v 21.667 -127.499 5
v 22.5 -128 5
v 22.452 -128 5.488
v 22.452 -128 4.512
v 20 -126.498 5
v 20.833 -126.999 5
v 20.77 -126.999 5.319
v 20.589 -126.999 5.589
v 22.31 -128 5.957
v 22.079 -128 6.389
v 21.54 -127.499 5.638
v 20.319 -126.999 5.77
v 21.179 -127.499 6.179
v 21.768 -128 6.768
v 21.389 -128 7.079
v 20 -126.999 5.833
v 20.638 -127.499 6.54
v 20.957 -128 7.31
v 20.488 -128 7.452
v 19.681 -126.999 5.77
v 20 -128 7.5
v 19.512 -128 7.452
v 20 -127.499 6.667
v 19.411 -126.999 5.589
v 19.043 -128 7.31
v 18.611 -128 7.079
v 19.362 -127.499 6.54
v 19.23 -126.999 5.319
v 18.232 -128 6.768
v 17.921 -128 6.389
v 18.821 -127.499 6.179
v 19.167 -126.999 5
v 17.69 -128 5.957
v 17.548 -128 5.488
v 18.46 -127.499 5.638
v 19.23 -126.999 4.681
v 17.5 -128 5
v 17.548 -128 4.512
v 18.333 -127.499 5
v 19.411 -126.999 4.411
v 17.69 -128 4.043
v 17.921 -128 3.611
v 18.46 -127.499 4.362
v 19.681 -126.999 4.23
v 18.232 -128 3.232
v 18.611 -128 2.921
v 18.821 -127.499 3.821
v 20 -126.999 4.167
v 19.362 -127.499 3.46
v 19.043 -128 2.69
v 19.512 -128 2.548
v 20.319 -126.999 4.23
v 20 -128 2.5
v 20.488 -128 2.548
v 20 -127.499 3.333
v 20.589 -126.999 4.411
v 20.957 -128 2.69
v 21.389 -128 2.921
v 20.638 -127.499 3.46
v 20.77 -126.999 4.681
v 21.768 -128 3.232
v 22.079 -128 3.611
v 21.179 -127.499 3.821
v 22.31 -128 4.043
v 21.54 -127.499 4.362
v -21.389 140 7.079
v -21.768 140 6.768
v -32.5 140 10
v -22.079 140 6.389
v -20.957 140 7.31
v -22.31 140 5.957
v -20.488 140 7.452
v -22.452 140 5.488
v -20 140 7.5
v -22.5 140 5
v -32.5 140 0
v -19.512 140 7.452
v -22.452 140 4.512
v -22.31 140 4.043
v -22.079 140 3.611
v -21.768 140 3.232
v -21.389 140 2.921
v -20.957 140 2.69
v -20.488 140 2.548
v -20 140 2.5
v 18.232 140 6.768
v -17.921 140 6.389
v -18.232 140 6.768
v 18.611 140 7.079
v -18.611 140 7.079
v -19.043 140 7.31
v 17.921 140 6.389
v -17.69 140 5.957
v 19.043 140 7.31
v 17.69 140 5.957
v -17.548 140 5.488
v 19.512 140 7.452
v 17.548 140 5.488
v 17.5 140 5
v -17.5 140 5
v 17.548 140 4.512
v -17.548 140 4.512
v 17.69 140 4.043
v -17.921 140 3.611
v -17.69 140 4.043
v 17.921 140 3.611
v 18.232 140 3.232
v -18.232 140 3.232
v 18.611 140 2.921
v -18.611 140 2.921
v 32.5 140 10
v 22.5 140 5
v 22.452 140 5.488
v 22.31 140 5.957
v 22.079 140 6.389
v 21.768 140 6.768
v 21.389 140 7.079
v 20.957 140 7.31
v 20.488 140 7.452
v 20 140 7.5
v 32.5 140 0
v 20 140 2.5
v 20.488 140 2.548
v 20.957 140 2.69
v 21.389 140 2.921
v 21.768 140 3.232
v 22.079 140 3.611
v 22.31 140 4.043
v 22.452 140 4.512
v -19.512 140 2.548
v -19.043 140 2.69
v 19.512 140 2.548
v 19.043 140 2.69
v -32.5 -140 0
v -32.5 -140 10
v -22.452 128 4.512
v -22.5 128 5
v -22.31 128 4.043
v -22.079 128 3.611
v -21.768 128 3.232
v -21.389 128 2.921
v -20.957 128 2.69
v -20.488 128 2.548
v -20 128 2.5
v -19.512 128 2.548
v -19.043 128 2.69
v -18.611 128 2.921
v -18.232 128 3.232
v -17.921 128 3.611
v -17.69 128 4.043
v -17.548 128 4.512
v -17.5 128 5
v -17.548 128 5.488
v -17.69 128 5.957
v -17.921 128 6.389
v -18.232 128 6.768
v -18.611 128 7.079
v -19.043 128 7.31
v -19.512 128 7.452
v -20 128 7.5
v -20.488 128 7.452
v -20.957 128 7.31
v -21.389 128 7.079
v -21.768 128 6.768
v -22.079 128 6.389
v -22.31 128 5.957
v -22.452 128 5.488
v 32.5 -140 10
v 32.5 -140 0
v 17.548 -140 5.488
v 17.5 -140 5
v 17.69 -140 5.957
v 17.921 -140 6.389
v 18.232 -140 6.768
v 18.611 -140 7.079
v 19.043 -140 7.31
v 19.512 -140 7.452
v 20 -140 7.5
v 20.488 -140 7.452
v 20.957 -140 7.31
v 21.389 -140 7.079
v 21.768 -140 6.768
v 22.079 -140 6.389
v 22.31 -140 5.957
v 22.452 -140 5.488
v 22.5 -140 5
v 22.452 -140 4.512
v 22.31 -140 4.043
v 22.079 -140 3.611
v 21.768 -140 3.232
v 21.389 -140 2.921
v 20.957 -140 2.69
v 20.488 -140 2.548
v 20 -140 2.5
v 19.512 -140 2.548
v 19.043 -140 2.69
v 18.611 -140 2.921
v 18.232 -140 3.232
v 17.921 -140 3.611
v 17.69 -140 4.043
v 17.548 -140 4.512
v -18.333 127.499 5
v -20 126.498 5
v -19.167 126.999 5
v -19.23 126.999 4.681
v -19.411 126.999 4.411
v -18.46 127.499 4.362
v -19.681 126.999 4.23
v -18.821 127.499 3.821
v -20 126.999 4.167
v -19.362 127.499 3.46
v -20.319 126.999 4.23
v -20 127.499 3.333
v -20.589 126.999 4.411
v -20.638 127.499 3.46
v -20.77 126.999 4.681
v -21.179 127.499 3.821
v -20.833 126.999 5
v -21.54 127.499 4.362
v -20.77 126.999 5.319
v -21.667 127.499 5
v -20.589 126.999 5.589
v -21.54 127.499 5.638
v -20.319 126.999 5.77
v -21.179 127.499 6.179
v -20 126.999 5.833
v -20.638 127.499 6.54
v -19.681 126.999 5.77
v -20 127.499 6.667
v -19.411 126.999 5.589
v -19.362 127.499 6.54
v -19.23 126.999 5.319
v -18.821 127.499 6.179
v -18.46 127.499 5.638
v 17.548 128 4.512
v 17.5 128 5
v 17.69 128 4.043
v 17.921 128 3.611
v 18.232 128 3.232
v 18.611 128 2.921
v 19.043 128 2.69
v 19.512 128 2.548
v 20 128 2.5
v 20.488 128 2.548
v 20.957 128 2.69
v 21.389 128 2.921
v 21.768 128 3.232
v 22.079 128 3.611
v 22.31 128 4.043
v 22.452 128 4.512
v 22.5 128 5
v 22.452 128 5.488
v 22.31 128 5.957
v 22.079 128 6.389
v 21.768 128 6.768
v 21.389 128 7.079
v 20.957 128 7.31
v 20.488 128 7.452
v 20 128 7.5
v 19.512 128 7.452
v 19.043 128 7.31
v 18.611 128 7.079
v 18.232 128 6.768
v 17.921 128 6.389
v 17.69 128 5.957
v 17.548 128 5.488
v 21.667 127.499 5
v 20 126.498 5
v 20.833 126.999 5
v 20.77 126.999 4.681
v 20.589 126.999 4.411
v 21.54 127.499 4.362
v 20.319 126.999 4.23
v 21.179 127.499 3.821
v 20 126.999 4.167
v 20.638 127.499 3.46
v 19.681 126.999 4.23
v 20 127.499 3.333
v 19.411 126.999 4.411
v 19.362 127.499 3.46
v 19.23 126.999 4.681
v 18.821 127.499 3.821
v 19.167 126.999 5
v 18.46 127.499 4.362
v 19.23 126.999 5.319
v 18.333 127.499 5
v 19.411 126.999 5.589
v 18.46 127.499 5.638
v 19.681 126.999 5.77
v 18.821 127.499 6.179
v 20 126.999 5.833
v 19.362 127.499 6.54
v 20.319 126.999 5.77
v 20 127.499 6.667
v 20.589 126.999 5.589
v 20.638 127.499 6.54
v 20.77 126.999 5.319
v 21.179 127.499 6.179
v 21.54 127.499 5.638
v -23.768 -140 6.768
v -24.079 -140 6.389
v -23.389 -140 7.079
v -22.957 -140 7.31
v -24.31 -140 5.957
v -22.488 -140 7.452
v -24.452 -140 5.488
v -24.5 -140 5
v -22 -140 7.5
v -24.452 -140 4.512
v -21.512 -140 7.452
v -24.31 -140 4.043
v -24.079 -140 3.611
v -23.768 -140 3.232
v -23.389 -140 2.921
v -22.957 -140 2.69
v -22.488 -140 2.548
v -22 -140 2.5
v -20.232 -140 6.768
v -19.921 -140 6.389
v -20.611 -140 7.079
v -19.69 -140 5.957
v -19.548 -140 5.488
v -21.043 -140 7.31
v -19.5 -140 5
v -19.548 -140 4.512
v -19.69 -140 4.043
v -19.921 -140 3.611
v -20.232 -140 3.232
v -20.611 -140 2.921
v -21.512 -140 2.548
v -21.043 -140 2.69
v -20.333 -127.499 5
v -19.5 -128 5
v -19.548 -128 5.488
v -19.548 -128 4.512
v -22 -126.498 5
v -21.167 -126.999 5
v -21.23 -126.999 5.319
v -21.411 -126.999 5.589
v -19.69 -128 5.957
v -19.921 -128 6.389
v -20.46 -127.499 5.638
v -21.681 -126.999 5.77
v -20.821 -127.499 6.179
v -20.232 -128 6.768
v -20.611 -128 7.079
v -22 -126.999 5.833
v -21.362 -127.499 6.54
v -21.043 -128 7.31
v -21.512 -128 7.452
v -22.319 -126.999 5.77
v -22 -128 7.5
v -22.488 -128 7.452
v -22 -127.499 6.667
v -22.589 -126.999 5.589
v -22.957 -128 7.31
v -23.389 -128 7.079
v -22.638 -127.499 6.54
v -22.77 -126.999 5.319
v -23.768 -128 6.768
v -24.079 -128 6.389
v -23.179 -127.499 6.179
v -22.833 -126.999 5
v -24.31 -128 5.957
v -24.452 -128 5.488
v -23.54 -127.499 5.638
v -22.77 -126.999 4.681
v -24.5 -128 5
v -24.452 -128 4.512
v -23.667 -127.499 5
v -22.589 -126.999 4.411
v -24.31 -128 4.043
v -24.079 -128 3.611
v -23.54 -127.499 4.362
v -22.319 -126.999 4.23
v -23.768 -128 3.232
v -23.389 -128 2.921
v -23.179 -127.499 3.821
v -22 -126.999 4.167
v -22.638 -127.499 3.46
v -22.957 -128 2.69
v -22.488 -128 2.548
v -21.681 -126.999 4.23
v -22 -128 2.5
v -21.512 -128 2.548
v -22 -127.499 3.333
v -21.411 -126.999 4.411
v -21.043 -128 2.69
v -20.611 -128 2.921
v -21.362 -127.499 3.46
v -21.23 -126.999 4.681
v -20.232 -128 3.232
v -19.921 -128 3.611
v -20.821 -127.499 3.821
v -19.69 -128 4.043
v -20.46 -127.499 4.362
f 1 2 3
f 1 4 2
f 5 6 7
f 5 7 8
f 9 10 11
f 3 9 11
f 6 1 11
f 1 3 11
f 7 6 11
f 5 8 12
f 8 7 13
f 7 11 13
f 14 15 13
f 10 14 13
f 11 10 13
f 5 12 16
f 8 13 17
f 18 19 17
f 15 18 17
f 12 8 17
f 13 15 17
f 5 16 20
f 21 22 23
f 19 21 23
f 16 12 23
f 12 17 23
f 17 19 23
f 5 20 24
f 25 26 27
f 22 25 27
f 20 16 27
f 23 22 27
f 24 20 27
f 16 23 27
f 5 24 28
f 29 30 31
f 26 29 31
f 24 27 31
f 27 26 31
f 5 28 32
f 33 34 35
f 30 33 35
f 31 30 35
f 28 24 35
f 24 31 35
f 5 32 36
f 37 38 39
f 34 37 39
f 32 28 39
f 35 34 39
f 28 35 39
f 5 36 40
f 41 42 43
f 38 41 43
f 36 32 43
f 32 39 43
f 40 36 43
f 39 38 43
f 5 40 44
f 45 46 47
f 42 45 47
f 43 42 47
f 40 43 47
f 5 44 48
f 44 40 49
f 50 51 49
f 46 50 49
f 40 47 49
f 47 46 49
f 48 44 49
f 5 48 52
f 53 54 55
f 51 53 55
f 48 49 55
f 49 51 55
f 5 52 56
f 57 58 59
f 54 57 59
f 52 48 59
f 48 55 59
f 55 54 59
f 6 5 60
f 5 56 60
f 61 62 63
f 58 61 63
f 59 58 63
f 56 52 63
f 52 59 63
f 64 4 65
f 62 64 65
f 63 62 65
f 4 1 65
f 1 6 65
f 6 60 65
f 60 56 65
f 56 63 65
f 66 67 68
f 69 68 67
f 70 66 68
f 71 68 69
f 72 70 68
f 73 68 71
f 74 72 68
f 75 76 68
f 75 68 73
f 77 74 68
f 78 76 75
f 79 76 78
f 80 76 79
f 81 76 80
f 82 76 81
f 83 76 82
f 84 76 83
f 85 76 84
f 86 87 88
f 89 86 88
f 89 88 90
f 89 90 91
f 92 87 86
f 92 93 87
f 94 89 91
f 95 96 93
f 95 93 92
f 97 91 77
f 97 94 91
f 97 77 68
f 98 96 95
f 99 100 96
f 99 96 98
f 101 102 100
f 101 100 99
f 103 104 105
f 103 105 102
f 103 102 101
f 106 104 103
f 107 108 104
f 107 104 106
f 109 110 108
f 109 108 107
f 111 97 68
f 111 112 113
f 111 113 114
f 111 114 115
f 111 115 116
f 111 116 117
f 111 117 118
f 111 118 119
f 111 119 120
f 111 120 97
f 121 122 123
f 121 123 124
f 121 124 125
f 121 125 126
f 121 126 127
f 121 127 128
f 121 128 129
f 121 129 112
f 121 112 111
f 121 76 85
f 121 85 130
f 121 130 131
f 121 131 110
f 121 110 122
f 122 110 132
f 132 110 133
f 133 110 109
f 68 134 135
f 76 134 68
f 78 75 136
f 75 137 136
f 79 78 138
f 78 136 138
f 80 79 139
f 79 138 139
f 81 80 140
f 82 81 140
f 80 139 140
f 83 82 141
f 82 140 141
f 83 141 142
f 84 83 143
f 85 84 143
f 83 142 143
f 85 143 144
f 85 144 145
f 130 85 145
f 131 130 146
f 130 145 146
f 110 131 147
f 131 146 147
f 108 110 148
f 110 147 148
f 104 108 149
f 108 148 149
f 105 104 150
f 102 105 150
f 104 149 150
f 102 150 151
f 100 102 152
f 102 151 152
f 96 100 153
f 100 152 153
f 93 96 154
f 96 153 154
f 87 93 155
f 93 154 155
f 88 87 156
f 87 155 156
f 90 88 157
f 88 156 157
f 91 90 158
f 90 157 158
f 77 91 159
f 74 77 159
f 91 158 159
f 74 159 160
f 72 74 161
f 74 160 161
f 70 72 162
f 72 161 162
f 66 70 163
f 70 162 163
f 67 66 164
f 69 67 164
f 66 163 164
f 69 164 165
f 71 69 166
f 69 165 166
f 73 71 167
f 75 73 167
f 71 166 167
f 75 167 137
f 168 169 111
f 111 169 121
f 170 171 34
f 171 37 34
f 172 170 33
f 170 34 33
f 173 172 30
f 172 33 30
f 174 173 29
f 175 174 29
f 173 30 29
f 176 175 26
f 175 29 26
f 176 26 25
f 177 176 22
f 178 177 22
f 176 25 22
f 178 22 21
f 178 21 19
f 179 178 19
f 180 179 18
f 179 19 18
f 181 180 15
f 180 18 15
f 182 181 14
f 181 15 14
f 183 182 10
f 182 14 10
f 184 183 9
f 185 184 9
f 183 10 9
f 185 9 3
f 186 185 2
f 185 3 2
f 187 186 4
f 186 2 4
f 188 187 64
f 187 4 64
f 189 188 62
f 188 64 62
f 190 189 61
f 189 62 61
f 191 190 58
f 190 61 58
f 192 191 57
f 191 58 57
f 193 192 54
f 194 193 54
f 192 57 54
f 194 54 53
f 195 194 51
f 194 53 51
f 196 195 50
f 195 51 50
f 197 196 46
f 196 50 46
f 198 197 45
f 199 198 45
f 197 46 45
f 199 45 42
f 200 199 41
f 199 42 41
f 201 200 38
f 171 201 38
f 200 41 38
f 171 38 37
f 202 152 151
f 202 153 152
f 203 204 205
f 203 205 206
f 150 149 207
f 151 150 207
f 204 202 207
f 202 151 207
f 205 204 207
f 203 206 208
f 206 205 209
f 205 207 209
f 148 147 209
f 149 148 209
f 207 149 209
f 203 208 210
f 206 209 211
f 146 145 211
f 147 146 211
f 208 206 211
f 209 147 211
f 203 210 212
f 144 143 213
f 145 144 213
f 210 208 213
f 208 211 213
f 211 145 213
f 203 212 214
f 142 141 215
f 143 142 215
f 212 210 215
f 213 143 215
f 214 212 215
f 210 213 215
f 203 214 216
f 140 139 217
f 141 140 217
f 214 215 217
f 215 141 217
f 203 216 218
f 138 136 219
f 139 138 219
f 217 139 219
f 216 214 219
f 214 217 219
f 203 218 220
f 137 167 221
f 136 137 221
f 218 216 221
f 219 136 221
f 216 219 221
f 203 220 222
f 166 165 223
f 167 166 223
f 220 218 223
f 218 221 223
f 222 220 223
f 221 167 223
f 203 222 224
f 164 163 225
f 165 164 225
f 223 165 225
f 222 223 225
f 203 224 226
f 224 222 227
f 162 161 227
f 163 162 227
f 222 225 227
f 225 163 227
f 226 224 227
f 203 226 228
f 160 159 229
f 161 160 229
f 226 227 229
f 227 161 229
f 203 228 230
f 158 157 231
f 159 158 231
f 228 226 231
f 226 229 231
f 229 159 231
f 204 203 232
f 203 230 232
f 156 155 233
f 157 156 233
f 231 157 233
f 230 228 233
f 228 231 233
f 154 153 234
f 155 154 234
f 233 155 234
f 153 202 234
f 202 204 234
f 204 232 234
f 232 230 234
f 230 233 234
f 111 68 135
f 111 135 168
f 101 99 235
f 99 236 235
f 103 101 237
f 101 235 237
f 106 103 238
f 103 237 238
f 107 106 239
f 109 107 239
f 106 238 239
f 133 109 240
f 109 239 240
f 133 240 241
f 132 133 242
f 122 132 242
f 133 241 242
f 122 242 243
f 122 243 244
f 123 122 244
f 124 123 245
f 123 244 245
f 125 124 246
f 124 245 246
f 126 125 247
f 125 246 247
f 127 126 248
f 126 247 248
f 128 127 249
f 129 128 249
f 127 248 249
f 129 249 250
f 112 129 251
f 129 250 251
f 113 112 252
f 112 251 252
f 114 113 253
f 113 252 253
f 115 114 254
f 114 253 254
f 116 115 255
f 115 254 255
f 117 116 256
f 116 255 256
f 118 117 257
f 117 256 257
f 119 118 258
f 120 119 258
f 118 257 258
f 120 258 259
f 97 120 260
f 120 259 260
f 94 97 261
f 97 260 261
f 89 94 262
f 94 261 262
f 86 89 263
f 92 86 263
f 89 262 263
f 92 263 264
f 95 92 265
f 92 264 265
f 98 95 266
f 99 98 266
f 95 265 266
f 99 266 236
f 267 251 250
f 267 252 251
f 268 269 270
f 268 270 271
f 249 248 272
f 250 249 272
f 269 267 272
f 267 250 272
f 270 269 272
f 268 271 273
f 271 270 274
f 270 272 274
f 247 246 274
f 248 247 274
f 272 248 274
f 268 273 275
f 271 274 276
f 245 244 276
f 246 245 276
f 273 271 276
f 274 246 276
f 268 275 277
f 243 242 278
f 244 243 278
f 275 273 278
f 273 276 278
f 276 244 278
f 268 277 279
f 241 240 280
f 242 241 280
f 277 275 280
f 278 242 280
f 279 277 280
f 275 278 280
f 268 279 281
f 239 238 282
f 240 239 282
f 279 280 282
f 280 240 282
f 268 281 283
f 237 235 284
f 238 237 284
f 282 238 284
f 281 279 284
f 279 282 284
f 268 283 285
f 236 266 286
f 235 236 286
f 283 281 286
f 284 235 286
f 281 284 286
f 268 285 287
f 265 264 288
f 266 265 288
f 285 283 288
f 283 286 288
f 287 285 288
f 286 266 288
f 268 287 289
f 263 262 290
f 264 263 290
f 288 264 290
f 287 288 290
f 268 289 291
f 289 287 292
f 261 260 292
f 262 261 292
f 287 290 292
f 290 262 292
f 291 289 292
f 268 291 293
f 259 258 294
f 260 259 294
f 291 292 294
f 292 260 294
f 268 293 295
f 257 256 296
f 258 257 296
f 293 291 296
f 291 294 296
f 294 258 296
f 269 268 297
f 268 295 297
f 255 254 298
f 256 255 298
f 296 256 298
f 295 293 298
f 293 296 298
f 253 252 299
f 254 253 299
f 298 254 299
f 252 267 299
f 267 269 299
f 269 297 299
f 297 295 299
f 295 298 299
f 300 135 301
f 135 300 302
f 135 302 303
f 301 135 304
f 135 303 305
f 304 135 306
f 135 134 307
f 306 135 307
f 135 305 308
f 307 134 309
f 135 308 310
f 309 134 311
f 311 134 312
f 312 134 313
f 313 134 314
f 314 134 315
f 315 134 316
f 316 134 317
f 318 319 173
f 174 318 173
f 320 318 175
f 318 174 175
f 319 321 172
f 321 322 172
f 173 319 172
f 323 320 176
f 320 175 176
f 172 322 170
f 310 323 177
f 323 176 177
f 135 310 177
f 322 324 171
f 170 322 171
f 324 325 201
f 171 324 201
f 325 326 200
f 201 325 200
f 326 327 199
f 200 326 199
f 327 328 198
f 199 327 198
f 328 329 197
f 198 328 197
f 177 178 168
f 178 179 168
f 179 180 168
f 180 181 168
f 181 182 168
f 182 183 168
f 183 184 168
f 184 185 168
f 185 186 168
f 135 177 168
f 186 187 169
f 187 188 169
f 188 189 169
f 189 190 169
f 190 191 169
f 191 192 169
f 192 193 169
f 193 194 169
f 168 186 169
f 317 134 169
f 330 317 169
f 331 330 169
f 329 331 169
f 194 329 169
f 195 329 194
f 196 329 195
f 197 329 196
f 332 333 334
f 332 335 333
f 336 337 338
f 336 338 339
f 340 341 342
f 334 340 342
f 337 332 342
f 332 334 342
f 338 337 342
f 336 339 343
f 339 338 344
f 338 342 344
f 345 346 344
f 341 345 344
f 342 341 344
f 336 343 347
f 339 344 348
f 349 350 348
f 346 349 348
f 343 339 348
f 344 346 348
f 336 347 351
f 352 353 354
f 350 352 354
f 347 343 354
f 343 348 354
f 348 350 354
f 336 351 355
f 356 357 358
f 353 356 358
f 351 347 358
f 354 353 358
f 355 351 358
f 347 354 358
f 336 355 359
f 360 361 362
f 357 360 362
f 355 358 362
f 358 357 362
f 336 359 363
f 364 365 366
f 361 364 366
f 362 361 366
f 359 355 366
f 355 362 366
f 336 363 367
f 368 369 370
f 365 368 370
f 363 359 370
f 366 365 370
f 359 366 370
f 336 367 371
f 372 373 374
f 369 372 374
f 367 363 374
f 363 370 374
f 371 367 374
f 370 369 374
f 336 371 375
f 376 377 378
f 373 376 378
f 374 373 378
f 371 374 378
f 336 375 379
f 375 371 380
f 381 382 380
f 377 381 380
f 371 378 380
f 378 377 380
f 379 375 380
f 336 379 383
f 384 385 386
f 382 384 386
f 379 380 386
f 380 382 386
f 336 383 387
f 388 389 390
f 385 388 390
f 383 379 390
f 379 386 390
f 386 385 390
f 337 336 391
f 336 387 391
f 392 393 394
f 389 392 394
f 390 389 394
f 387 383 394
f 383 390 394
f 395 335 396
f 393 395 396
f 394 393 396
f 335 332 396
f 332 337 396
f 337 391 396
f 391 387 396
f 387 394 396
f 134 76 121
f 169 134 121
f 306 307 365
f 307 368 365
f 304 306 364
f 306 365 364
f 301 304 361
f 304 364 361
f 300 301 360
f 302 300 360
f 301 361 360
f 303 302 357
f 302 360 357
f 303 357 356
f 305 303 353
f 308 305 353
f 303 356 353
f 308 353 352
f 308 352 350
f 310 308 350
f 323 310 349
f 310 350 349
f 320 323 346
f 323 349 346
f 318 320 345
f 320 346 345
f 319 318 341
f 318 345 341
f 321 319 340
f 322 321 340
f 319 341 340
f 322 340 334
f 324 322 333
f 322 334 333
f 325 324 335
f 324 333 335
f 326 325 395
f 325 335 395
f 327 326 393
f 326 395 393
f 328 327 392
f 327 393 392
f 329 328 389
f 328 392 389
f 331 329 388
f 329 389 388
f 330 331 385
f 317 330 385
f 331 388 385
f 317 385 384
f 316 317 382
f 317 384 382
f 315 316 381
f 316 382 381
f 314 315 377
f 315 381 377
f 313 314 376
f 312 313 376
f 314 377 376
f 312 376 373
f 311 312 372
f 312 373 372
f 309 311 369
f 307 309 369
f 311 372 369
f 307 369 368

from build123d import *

# Parameters (mm, degrees)
F0_W     = 65
F0_H     = 280
F1_DEPTH = 10
F4_D     = 5
F4_DEPTH = 12
F4_TIP   = 1.5021515476
F7_D     = 5
F7_DEPTH = 12
F7_TIP   = 1.5021515476


with BuildPart() as f1:
    # F0 (on Top) → F1 (new body)
    with BuildSketch(Plane.XY):
        Rectangle(F0_W, F0_H)
    extrude(amount=F1_DEPTH)

    # F4
    with Locations(Plane.XZ.offset(140)):
        with Locations((-22, 5), (20, 5)):
            Hole(F4_D / 2, depth=F4_DEPTH)
            with Locations((0, 0, -(F4_DEPTH + F4_TIP / 2))):  # 118° drill point
                Cone(0, F4_D / 2, F4_TIP, mode=Mode.SUBTRACT)

    # F7
    with Locations(Plane(origin=(0, 140, 0), x_dir=(1, 0, 0), z_dir=(0, 1, 0))):
        with Locations((-20, -5), (20, -5)):
            Hole(F7_D / 2, depth=F7_DEPTH)
            with Locations((0, 0, -(F7_DEPTH + F7_TIP / 2))):  # 118° drill point
                Cone(0, F7_D / 2, F7_TIP, mode=Mode.SUBTRACT)


solid = f1.part
